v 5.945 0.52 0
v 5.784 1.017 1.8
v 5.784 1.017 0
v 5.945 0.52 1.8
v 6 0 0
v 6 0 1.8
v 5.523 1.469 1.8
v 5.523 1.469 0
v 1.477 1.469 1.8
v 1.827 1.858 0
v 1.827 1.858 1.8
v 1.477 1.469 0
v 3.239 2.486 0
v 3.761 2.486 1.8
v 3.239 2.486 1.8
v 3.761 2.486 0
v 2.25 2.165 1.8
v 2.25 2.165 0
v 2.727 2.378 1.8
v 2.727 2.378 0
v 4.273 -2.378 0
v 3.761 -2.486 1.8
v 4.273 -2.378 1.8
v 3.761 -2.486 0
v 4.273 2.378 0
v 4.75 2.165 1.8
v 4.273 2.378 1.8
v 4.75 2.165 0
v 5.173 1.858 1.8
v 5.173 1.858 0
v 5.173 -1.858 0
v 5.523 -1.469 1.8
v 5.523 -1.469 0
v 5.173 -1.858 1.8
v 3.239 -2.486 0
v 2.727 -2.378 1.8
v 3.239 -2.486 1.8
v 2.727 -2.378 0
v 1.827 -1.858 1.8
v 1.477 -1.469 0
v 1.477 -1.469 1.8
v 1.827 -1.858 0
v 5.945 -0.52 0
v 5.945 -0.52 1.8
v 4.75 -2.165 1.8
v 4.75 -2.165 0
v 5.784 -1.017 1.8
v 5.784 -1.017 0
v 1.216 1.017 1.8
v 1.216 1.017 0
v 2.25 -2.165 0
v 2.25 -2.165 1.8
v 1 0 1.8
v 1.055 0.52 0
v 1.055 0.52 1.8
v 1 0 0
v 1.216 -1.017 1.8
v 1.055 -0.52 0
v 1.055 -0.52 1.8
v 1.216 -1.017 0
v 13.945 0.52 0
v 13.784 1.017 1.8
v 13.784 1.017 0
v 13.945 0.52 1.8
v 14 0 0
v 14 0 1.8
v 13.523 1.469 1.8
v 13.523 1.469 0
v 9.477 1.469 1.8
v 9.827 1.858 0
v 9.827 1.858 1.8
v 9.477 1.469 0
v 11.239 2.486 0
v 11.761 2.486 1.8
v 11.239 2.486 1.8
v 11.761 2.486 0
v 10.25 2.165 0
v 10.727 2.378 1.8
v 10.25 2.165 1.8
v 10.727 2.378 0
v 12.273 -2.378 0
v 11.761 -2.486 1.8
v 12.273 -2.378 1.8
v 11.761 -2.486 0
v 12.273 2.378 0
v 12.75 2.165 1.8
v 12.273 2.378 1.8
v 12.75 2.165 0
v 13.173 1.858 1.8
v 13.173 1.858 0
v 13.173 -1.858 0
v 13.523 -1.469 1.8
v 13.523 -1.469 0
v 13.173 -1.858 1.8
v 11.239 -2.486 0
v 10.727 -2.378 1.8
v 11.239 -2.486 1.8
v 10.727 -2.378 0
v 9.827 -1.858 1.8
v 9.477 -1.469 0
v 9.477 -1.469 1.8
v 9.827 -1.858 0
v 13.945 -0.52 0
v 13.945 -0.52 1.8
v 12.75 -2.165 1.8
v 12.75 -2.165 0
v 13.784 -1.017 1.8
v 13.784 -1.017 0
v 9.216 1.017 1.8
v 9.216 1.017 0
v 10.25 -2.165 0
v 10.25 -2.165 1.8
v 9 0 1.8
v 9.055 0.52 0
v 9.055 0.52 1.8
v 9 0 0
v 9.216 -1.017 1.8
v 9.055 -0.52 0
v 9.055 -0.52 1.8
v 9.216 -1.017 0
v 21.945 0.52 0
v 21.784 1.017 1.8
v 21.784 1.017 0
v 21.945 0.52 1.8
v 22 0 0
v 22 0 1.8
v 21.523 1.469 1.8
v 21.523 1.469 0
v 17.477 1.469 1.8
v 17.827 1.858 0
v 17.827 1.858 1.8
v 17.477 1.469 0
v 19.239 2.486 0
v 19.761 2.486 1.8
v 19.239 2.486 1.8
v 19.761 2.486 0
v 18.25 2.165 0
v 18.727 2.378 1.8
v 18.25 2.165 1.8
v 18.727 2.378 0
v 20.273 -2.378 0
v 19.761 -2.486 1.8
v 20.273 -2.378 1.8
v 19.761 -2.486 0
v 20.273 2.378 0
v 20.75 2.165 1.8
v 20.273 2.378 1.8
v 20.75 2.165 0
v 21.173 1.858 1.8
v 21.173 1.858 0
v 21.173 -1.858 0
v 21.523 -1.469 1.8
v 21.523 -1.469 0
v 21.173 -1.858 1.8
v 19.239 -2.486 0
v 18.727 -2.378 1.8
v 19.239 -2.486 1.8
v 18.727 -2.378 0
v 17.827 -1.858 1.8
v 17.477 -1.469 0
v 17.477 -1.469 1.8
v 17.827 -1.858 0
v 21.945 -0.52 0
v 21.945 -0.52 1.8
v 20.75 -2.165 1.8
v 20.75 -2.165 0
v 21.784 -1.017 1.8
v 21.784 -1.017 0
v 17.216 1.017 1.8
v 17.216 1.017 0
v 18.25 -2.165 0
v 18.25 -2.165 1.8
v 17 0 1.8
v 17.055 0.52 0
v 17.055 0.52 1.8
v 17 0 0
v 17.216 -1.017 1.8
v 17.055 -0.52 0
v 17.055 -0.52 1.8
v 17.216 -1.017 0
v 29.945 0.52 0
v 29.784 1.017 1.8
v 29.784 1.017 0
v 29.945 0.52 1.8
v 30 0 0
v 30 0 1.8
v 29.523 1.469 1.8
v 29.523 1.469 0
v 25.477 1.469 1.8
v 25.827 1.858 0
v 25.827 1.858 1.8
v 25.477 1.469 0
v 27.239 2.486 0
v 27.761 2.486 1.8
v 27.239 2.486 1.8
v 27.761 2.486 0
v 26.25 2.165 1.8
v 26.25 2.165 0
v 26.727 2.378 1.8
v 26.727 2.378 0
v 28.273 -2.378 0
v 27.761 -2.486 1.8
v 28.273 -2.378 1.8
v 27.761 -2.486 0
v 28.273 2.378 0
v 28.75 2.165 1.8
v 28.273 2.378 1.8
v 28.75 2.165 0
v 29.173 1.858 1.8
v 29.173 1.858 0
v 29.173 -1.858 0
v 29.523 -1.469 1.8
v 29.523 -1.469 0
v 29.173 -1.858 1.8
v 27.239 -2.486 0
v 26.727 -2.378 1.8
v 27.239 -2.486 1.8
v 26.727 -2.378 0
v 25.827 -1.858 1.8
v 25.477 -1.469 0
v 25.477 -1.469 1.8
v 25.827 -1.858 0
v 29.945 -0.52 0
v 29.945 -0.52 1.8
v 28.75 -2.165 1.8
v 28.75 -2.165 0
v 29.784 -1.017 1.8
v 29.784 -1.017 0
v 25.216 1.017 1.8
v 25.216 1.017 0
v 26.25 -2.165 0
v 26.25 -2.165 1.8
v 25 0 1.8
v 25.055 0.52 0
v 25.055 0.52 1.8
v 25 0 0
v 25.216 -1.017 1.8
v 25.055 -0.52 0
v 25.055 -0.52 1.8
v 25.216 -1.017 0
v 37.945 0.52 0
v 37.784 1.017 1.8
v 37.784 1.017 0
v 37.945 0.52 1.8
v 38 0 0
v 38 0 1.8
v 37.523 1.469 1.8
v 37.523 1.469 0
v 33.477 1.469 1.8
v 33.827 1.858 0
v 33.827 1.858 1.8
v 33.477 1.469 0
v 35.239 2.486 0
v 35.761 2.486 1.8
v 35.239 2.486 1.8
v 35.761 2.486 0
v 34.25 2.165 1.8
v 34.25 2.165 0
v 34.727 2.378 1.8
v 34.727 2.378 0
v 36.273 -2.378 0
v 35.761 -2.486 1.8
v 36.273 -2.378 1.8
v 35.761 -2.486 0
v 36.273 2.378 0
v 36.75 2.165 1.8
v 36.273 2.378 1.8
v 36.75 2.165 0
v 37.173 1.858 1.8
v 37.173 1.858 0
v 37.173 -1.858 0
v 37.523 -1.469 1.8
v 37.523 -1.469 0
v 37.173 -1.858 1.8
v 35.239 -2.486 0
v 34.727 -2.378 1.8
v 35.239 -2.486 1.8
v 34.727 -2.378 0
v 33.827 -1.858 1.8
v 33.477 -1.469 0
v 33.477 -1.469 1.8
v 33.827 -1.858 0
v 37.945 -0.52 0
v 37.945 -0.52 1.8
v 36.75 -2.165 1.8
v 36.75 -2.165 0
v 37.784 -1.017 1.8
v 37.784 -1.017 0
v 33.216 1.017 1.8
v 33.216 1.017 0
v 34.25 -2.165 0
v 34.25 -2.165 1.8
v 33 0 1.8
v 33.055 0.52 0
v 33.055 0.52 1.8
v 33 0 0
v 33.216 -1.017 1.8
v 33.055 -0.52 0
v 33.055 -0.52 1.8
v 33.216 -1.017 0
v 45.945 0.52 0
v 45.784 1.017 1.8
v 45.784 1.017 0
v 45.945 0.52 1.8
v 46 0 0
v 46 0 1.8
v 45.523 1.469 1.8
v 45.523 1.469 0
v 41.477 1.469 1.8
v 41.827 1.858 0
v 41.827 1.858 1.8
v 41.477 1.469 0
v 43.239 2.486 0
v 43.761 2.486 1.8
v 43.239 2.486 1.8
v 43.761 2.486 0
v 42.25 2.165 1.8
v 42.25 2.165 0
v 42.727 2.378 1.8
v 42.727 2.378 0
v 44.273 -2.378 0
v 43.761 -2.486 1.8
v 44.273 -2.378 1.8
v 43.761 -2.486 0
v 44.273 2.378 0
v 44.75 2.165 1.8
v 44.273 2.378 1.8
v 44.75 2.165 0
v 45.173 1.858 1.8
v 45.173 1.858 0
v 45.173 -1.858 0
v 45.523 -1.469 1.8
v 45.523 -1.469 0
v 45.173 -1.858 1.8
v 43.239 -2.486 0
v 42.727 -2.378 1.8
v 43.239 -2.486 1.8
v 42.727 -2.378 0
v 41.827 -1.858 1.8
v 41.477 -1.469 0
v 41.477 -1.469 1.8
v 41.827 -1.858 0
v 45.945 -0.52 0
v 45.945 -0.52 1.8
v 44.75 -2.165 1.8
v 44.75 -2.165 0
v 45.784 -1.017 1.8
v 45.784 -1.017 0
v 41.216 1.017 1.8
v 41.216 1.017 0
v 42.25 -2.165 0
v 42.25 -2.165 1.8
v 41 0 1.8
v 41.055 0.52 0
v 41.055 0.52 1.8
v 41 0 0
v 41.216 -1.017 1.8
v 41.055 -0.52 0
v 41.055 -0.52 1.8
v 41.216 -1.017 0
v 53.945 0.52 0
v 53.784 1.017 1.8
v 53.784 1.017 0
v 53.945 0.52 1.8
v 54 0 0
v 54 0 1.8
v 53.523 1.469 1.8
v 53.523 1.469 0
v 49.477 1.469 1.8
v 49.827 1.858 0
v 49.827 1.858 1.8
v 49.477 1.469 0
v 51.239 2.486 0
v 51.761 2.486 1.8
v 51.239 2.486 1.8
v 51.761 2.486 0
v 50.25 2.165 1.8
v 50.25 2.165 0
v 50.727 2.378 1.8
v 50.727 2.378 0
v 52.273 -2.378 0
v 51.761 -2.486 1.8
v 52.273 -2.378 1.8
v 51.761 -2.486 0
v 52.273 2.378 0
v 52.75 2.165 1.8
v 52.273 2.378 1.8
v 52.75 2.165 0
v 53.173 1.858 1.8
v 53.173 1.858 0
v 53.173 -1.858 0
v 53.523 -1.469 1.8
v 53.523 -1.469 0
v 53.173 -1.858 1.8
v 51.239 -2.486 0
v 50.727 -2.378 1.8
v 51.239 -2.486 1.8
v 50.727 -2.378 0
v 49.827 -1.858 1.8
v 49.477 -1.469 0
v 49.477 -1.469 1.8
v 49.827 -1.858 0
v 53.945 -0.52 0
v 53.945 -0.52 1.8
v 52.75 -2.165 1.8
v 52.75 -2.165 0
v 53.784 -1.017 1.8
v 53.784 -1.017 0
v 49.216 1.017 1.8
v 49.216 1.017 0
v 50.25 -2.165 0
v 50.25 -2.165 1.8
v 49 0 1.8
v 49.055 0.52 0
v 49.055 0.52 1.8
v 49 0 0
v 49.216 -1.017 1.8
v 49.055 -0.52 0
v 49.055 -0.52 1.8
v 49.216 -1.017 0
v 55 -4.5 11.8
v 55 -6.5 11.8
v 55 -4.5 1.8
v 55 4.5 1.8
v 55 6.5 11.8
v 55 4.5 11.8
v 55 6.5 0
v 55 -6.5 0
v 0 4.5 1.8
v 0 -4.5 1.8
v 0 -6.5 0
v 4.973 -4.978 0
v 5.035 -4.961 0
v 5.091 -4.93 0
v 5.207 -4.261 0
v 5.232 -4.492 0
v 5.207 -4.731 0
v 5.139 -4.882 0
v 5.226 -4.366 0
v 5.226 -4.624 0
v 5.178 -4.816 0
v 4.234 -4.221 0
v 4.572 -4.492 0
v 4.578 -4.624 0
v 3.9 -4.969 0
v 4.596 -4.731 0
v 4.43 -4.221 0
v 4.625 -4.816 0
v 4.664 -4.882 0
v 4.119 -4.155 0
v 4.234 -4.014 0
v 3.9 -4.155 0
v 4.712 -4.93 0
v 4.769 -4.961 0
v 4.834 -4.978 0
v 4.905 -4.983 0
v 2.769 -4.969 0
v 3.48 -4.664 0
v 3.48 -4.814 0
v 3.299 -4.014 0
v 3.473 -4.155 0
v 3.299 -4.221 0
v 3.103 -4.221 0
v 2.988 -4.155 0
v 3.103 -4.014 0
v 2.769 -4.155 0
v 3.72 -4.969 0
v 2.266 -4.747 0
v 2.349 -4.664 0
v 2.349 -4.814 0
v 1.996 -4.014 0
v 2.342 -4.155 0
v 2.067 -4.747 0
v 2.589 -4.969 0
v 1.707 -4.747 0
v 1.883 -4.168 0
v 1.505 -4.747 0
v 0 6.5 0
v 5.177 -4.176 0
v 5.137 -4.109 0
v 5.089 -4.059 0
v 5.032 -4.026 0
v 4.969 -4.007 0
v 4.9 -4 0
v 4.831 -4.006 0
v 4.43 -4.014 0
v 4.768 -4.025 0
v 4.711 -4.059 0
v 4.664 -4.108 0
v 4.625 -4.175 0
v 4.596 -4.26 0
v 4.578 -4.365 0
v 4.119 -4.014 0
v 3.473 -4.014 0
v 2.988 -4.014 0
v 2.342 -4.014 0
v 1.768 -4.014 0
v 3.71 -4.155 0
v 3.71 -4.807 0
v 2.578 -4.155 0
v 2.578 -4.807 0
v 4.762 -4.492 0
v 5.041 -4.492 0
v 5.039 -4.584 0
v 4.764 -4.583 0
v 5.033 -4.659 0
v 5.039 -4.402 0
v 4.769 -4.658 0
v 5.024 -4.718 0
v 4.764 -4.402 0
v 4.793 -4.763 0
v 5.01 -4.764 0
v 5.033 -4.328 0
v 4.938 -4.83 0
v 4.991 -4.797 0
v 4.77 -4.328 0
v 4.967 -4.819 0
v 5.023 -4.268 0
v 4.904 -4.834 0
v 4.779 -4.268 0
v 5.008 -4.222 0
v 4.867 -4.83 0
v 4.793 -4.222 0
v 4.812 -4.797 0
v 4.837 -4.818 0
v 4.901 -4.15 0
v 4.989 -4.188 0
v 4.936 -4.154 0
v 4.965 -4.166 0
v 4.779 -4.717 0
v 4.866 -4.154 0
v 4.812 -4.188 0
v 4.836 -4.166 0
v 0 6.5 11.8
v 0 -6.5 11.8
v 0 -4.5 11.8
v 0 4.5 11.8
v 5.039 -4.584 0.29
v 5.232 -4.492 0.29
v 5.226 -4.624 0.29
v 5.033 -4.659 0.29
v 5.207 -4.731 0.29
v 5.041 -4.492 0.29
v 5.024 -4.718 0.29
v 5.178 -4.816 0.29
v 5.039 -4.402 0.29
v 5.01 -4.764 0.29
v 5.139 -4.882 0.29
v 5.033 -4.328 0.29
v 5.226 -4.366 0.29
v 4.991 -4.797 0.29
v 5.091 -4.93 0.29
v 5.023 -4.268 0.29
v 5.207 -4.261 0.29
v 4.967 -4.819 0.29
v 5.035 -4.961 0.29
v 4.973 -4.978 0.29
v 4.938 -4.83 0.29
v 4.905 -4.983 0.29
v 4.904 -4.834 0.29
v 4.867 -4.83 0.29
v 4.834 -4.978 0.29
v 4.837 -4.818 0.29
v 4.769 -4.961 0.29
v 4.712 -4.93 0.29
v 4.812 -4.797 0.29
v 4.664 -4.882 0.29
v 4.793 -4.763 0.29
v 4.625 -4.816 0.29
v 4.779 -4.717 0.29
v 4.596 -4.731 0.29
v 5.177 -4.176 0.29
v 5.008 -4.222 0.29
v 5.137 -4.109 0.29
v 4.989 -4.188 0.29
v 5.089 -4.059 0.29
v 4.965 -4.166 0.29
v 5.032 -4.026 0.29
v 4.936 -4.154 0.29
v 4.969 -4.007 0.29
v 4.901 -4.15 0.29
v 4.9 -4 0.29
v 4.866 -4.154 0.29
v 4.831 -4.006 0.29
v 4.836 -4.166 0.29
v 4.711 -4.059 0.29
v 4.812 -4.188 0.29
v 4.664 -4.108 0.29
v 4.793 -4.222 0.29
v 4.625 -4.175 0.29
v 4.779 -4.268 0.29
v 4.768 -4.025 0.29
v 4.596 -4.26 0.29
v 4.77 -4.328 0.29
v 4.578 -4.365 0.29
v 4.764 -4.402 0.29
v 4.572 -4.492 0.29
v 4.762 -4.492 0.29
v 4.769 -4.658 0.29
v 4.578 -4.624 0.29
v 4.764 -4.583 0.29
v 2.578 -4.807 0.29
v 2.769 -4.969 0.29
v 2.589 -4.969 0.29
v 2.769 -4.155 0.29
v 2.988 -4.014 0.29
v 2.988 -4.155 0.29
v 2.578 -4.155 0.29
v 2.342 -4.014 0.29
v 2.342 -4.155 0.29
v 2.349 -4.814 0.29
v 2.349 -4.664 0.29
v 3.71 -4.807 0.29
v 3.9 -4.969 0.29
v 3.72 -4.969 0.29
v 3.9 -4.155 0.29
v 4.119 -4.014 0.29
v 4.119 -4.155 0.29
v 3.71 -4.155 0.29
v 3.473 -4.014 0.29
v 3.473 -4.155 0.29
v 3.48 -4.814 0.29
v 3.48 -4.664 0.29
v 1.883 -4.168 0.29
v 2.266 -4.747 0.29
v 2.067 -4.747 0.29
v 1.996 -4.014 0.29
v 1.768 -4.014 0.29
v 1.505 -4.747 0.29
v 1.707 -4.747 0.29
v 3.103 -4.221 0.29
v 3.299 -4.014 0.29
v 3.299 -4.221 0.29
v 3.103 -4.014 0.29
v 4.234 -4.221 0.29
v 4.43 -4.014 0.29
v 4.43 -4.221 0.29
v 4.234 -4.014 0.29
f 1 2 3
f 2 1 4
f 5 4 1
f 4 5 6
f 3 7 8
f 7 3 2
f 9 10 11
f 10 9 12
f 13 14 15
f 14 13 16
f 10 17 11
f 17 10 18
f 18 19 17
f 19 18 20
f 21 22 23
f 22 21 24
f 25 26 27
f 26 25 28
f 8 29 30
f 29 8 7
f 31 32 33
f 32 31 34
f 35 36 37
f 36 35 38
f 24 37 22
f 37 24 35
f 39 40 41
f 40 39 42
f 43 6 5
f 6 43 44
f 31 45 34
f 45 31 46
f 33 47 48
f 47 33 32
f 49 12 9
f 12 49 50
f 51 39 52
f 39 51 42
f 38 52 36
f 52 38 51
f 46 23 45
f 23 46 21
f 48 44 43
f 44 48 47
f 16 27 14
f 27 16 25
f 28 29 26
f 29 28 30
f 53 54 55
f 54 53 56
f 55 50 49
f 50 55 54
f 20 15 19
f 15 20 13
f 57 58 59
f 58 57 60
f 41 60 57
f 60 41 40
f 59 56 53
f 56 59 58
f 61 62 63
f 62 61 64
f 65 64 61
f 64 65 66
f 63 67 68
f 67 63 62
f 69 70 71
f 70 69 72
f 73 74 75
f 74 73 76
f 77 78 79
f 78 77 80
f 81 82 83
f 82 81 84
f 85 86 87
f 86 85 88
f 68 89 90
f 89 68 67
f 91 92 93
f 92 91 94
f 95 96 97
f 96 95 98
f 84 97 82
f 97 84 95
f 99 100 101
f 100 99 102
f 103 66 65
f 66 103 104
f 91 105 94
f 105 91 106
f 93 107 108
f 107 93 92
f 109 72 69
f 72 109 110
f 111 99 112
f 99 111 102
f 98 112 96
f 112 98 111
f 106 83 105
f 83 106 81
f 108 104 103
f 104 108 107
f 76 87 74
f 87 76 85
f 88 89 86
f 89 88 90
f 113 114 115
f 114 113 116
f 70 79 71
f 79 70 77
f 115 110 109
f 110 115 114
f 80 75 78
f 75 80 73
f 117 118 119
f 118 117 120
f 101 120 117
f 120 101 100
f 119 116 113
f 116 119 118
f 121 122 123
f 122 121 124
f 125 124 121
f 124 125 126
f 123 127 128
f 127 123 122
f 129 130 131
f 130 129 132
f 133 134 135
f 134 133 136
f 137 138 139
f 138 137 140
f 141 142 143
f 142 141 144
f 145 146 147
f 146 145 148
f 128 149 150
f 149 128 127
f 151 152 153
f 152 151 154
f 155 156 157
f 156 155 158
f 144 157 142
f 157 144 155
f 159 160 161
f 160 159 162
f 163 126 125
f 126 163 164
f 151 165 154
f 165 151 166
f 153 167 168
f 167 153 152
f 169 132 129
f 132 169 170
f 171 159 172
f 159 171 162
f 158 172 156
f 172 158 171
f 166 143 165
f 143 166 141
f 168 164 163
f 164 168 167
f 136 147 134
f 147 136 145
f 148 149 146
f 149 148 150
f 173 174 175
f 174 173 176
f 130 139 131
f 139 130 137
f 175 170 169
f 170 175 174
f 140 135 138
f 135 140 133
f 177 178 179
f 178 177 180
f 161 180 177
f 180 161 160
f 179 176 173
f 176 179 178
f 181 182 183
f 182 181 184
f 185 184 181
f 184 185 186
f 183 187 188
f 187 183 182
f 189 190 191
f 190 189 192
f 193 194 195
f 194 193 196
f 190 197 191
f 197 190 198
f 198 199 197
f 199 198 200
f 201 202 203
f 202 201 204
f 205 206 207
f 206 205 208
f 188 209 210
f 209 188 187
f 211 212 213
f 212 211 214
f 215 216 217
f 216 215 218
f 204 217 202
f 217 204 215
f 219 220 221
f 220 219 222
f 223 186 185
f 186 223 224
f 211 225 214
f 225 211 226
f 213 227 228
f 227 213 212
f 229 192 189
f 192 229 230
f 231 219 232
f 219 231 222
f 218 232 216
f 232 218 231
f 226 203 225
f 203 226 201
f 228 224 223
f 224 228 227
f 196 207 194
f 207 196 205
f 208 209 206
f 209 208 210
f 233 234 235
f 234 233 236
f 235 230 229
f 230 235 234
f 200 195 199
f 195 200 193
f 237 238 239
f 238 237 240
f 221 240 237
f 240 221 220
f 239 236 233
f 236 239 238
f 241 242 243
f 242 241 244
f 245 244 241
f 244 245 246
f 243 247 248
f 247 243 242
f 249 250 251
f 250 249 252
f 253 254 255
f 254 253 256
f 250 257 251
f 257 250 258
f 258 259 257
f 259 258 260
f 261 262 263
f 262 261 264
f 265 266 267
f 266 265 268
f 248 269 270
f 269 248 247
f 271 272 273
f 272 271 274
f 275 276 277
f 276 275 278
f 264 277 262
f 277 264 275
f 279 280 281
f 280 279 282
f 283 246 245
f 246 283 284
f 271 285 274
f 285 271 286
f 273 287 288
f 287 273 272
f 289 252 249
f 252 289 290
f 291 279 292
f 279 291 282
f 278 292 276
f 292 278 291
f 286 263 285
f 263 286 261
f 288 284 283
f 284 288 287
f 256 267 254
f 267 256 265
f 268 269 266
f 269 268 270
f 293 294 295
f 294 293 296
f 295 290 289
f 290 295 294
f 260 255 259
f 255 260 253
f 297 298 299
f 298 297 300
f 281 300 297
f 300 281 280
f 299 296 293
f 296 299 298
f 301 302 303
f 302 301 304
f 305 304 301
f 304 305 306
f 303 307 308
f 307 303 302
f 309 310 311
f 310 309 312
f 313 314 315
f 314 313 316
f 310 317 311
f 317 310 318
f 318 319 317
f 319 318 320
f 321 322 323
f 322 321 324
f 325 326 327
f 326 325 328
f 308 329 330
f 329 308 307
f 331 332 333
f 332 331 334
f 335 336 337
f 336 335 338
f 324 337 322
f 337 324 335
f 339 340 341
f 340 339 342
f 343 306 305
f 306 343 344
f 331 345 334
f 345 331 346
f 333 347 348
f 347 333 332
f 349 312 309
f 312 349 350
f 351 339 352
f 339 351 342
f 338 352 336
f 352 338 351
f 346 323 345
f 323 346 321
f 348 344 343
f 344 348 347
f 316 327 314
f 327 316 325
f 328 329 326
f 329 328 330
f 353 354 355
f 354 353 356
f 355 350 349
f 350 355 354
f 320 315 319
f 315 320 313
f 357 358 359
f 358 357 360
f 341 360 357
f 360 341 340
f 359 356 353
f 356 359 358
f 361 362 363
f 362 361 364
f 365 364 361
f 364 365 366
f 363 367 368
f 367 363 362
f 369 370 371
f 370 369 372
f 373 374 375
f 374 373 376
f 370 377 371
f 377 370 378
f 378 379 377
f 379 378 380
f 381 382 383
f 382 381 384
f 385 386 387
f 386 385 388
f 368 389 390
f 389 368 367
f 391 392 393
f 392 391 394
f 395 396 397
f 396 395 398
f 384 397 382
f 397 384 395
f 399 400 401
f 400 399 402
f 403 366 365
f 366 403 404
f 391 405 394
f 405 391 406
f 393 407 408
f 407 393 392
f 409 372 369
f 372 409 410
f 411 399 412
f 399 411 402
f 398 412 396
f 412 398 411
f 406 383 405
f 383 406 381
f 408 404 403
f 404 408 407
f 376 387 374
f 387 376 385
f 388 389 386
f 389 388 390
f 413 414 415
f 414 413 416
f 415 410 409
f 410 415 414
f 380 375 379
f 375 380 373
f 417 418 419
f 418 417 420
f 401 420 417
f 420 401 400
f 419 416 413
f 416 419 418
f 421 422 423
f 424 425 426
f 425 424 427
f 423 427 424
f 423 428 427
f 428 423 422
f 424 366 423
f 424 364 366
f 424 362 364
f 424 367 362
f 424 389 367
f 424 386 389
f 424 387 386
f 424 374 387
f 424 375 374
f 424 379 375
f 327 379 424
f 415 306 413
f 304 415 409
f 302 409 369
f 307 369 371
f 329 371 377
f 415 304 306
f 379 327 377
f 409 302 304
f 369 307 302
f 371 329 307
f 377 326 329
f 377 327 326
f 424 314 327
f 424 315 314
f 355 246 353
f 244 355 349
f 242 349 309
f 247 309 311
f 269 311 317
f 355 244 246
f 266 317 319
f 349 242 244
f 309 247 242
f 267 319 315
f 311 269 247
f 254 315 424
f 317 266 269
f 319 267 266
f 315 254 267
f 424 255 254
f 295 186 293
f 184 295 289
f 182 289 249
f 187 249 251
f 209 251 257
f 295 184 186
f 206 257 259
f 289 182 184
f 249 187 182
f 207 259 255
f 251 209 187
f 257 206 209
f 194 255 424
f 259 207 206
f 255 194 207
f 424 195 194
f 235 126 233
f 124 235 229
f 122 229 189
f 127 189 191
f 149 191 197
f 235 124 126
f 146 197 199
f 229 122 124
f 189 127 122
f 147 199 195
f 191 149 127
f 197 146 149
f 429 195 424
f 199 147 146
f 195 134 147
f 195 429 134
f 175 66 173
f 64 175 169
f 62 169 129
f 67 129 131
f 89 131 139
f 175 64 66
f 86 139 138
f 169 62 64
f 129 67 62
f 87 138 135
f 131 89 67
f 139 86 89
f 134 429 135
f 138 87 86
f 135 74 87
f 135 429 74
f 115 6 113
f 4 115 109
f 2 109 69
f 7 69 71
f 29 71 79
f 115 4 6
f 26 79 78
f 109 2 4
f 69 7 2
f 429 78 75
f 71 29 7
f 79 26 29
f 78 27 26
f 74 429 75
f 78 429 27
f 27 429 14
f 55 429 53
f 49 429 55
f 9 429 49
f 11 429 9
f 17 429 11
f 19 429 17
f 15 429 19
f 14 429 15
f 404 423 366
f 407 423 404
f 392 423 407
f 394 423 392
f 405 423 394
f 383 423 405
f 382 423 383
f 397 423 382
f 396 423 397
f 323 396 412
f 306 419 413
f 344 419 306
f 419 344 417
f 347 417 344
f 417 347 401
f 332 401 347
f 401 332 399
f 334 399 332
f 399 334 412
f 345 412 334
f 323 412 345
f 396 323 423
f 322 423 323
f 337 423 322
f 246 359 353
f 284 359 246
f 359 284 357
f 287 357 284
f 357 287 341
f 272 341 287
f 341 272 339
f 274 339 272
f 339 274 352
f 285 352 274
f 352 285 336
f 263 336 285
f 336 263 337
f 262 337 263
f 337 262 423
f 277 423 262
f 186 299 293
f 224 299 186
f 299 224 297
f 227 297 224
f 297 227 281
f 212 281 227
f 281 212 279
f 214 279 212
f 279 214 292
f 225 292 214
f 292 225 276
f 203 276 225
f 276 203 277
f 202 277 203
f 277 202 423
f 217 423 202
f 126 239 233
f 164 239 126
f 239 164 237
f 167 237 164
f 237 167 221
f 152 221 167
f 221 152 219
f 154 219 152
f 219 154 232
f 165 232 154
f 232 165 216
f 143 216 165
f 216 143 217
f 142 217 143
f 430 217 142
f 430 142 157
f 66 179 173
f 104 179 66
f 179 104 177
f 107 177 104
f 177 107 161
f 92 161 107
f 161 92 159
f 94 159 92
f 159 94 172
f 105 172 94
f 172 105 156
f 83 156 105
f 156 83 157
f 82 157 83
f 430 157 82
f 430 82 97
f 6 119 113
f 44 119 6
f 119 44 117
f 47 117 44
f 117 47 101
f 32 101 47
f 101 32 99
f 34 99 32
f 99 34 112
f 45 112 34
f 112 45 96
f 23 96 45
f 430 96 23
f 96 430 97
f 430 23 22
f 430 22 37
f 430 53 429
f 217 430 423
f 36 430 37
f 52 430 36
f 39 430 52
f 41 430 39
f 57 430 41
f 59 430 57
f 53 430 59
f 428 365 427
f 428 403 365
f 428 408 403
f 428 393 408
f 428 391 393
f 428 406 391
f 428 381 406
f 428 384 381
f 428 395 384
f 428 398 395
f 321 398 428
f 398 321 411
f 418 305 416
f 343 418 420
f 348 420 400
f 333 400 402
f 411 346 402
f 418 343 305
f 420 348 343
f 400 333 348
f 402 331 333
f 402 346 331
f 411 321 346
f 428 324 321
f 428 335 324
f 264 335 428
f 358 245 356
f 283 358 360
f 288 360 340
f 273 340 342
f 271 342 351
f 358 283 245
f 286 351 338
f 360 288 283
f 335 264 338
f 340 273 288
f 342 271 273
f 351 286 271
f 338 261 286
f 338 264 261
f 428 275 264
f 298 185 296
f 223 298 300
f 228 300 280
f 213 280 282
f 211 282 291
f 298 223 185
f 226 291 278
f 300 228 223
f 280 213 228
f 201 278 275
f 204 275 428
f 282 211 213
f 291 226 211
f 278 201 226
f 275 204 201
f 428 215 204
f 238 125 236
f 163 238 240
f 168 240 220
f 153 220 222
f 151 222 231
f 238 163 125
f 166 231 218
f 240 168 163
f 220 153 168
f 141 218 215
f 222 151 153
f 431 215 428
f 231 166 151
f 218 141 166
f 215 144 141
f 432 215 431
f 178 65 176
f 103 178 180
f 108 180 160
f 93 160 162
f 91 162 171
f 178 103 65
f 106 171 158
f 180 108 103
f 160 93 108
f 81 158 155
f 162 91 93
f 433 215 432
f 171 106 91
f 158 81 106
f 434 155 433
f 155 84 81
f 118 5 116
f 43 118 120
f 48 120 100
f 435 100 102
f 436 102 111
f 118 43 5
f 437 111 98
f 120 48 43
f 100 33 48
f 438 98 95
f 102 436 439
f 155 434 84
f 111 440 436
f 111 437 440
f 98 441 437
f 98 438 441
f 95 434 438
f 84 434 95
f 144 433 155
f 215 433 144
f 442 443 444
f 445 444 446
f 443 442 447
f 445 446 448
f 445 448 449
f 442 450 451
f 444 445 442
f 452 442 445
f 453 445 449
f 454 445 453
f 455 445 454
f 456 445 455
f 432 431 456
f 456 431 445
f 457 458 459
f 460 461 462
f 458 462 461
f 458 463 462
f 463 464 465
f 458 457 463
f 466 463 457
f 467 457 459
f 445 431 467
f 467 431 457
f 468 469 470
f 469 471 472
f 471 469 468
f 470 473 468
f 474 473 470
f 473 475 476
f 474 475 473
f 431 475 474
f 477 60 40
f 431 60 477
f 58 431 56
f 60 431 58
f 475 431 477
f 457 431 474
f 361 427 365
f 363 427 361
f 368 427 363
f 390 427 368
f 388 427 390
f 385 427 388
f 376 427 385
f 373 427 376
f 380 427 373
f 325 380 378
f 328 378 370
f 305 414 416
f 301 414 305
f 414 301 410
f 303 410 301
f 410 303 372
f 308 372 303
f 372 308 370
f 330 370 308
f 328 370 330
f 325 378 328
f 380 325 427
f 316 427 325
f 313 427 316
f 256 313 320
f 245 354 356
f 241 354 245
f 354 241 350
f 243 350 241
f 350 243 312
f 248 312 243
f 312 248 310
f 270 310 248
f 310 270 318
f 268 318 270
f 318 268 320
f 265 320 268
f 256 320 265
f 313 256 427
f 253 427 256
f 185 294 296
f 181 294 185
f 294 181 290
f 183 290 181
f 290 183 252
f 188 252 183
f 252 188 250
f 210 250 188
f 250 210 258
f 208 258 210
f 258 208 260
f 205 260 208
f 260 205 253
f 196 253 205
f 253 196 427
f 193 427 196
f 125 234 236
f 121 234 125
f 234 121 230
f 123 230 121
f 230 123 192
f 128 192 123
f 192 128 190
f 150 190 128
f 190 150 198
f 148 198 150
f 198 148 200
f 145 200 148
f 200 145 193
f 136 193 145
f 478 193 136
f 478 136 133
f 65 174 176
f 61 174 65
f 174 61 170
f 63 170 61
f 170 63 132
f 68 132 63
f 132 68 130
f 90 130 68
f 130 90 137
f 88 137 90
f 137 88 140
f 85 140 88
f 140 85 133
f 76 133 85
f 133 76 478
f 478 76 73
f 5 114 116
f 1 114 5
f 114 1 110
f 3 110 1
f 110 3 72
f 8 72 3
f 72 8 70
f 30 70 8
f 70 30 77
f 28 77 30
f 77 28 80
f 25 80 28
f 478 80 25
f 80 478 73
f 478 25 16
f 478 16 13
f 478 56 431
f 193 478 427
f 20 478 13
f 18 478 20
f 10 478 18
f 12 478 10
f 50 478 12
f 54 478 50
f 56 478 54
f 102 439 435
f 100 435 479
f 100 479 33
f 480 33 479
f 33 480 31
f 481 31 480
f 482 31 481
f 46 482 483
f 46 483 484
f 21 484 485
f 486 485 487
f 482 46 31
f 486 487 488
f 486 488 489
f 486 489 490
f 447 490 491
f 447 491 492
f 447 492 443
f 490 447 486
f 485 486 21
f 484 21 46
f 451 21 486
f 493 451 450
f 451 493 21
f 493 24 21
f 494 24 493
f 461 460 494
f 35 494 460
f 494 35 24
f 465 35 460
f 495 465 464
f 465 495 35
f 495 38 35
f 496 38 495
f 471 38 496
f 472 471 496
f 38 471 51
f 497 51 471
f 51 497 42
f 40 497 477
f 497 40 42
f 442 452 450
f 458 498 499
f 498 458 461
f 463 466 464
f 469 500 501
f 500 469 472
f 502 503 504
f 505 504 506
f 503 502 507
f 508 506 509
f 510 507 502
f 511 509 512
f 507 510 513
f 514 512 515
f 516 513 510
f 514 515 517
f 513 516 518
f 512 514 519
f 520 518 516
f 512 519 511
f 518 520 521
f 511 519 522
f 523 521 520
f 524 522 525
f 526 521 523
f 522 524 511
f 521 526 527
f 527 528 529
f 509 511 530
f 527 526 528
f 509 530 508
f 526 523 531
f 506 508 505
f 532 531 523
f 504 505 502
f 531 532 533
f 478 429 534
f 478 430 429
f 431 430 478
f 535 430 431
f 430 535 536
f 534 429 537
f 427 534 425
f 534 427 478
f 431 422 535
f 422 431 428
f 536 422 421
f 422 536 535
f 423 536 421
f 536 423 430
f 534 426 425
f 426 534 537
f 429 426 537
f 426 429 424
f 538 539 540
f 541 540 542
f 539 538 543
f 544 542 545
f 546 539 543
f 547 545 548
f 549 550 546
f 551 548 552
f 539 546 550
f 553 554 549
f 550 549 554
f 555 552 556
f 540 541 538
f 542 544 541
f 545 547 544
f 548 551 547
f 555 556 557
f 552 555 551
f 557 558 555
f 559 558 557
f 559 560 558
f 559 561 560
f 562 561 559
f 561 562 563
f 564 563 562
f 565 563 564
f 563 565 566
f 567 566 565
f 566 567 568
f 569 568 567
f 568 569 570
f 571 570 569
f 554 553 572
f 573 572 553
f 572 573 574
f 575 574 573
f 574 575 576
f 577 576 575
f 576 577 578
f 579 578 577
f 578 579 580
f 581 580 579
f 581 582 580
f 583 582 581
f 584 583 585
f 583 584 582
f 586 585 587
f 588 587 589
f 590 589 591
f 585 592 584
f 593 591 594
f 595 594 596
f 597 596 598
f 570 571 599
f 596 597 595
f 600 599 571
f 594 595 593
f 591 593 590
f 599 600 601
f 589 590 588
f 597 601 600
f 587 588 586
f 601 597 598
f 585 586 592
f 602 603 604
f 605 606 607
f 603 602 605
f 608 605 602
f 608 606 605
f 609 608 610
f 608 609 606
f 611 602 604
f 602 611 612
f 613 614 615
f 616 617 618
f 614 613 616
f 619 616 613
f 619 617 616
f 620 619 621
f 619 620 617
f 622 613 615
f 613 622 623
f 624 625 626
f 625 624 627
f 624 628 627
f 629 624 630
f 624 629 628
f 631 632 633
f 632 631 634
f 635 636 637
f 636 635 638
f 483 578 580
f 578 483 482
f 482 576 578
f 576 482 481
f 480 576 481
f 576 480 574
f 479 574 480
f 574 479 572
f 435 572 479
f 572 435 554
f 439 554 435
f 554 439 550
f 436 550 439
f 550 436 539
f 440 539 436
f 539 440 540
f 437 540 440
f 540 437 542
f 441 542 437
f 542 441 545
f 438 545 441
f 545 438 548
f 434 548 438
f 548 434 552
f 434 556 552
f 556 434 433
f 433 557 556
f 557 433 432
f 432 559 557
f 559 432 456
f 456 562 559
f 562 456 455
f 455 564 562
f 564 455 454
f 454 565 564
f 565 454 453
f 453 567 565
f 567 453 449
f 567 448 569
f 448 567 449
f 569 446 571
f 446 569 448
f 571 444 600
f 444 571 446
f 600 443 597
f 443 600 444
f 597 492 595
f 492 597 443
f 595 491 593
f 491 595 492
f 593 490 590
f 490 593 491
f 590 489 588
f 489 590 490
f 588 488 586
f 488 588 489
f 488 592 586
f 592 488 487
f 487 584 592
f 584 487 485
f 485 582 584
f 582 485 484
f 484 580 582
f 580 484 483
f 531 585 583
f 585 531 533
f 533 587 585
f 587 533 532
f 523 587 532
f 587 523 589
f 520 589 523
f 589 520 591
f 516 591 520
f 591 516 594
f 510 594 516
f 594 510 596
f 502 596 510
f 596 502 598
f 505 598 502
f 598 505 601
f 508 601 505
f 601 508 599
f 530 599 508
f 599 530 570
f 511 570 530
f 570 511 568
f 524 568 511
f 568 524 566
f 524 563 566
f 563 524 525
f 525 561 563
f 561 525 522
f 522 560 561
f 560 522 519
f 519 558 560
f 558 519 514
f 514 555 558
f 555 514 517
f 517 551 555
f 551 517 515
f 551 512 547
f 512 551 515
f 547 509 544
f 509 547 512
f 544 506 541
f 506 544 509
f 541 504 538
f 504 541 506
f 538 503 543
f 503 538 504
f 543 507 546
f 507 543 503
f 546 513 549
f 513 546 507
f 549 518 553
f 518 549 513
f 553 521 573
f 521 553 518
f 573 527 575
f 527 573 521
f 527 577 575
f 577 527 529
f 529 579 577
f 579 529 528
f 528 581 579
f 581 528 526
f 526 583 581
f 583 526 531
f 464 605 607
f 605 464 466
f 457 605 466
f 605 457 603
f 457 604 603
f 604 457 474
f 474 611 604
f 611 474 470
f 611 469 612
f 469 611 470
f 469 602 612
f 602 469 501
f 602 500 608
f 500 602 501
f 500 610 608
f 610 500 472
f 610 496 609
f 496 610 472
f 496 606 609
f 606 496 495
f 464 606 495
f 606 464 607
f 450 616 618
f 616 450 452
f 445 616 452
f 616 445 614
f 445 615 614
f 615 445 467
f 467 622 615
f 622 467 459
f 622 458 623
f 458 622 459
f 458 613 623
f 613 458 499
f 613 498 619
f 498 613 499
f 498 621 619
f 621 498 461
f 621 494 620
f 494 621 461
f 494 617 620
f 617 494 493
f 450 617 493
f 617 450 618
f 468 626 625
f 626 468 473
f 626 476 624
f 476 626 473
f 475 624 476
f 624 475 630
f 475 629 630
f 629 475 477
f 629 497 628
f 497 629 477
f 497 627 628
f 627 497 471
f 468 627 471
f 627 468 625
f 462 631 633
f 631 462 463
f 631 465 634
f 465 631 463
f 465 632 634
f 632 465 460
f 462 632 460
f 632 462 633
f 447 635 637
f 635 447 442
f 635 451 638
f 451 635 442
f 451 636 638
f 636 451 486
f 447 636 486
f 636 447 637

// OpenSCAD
// file: common.scad
CENTER_SIZE = 9;
SLEEVE_LENGTH = 55;
SLEEVE_REACH = SLEEVE_LENGTH + CENTER_SIZE/2;
GROOVE_WIDTH = 9;
WALL_HEIGHT = 10;
WALL_THICKNESS = 2;
BASE_THICKNESS = 2;
TOTAL_WIDTH = GROOVE_WIDTH + 2 * WALL_THICKNESS;
DOWEL_DIAMETER = 4.5;
DOWEL_DEPTH = 3;
CARDBOARD_THICKNESS = 2;
GROOVE_BOTTOM = CARDBOARD_THICKNESS;
CURVE_POWER = 2;
CURVE_POINTS = 20;
TILT_ANGLE_EXTRA = 5;
FLEXIBLE_WALL_HEIGHT = WALL_HEIGHT * 2;

LEFT = 3;
RIGHT = 1;

function wall_curve(z, wall_height) =
    GROOVE_BOTTOM/2 + (GROOVE_WIDTH/2 - GROOVE_BOTTOM/2) * pow(z/wall_height, CURVE_POWER);

module curved_wall_profile(side, wall_height) {
    points_inner = [for (i = [0:CURVE_POINTS])
        [wall_curve(i * wall_height / CURVE_POINTS, wall_height) * side,
         i * wall_height / CURVE_POINTS]
    ];
    points_outer = [for (i = [0:CURVE_POINTS])
        [(wall_curve(i * wall_height / CURVE_POINTS, wall_height) + WALL_THICKNESS) * side,
         i * wall_height / CURVE_POINTS]
    ];
    all_points = concat(
        [[points_inner[0][0], 0]],
        points_inner,
        [points_outer[len(points_outer)-1]],
        [for (i = [len(points_outer)-1:-1:0]) points_outer[i]],
        [[points_outer[0][0], 0]]
    );
    polygon(all_points);
}

module draw_regular_wall_base(width, z_offset = BASE_THICKNESS) {
    translate([0, 0, z_offset])
        cube([width, WALL_THICKNESS, WALL_HEIGHT]);
}

module draw_flexible_wall_base(width, z_offset = BASE_THICKNESS) {
    wall_height = FLEXIBLE_WALL_HEIGHT - z_offset;
    tilt_angle = atan((GROOVE_WIDTH/2 - GROOVE_BOTTOM/2) / wall_height) + TILT_ANGLE_EXTRA;
    translate([0, -WALL_THICKNESS/2, z_offset - 2])
        rotate([tilt_angle + 6, 0, 0])
            rotate([90, 0, 90])
                linear_extrude(height = width)
                    curved_wall_profile(1, wall_height);
}

module draw_center_base(with_dowel = false) {
    union() {
        translate([-TOTAL_WIDTH/2, -TOTAL_WIDTH/2, 0])
            cube([TOTAL_WIDTH, TOTAL_WIDTH, BASE_THICKNESS]);
        if (with_dowel) {
            translate([0, 0, -DOWEL_DEPTH])
                cylinder(h=DOWEL_DEPTH, d=DOWEL_DIAMETER, $fn=30);
        }
    }
}

module orient_wall(side) {
    if (side == 0) {
        rotate([0, 0, 270])
            children();
    } else if (side == 1) {
        children();
    } else if (side == 2) {
        rotate([0, 0, 90])
            children();
    } else if (side == 3) {
        rotate([0, 0, 180])
            children();
    }
}

module translate_center_wall(side) {
    if (side == 0) {
        translate([CENTER_SIZE/2, TOTAL_WIDTH/2, 0])
            children();
    } else if (side == 1) {
        translate([-TOTAL_WIDTH/2, CENTER_SIZE/2, 0])
            children();
    } else if (side == 2) {
        translate([-CENTER_SIZE/2, -TOTAL_WIDTH/2, 0])
            children();
    } else if (side == 3) {
        translate([TOTAL_WIDTH/2, -CENTER_SIZE/2, 0])
            children();
    }
}

module position_center_wall(side) {
    translate_center_wall(side) {
        orient_wall(side) {
            children();
        }
    }
}

module place_center_wall(side, wall_type = "regular", z_offset = BASE_THICKNESS) {
    position_center_wall(side) {
        if (wall_type == "regular") {
            draw_regular_wall_base(TOTAL_WIDTH, z_offset);
        } else {
            draw_flexible_wall_base(TOTAL_WIDTH, z_offset);
        }
    }
}

module draw_sleeve_base(with_dowel = false) {
    union() {
        translate([0, -TOTAL_WIDTH/2, 0])
            cube([SLEEVE_LENGTH, TOTAL_WIDTH, BASE_THICKNESS]);
        if (with_dowel) {
            translate([25 - CENTER_SIZE/2, 0, -DOWEL_DEPTH])
                cylinder(h=DOWEL_DEPTH, d=DOWEL_DIAMETER, $fn=30);
            translate([50 - CENTER_SIZE/2, 0, -DOWEL_DEPTH])
                cylinder(h=DOWEL_DEPTH, d=DOWEL_DIAMETER, $fn=30);
        }
    }
}

module translate_sleeve_wall(side) {
    if (side == LEFT) {
        translate([SLEEVE_LENGTH, -TOTAL_WIDTH/2 + WALL_THICKNESS, 0])
            children();
    } else if (side == RIGHT) {
        translate([0, TOTAL_WIDTH/2 - WALL_THICKNESS, 0])
            children();
    }
}

module position_sleeve_wall(side) {
    translate_sleeve_wall(side) {
        orient_wall(side) {
            children();
        }
    }
}

module draw_sleeve_wall(side, wall_type = "regular", z_offset = BASE_THICKNESS) {
    position_sleeve_wall(side) {
        if (wall_type == "regular") {
            draw_regular_wall_base(SLEEVE_LENGTH, z_offset);
        } else {
            draw_flexible_wall_base(SLEEVE_LENGTH, z_offset);
        }
    }
}

module draw_full_sleeve(with_dowel = false, wall_type = "regular", z_offset = BASE_THICKNESS) {
    union() {
        draw_sleeve_base(with_dowel);
        draw_sleeve_wall(LEFT, wall_type, z_offset);
        draw_sleeve_wall(RIGHT, wall_type, z_offset);
    }
}

module place_sleeve(side, with_dowel = false, wall_type = "regular", z_offset = BASE_THICKNESS) {
    if (side == 0) {
        translate([CENTER_SIZE/2, 0, 0])
            draw_full_sleeve(with_dowel, wall_type, z_offset);
    } else if (side == 1) {
        rotate([0, 0, 90])
            translate([CENTER_SIZE/2, 0, 0])
                draw_full_sleeve(with_dowel, wall_type, z_offset);
    } else if (side == 2) {
        rotate([0, 0, 180])
            translate([CENTER_SIZE/2, 0, 0])
                draw_full_sleeve(with_dowel, wall_type, z_offset);
    } else if (side == 3) {
        rotate([0, 0, 270])
            translate([CENTER_SIZE/2, 0, 0])
                draw_full_sleeve(with_dowel, wall_type, z_offset);
    }
}

module add_dowel(x, y, dowel_diameter, dowel_depth) {
    translate([x, y, -dowel_depth])
        cylinder(h=dowel_depth, d=dowel_diameter, $fn=30);
}
// file: version.scad
VERSION = "v1.1.0";

module engrave_version_text(text, size=1.0, depth=0.3) {
    linear_extrude(height=depth)
        text(text, size=size, font="Liberation Sans:style=Bold", halign="left", valign="bottom");
}

module print_version_at(x, y, z) {
    translate([x, y, z])
        rotate([180, 0, 0])
            translate([0, 0, -0.29])
                engrave_version_text(VERSION);
}

module print_version(x=-5, y=-4, z=0) {
    print_version_at(x, y, z);
}

module print_version_sleeve(x=1.5, y=-4, z=0) {
    print_version_at(x, y, z);
}
// file: lego.scad
include <common.scad>

LEGO_STUD_DIAMETER = 4.8;
LEGO_STUD_HEIGHT = 1.8;
LEGO_UNIT = 8;
LEGO_HOLE_DIAMETER = 5.0;
LEGO_NICHE_DEPTH = 2.2;
LEGO_NICHE_ROOF = 1.0;
LEGO_NICHE_BASE_THICKNESS = LEGO_NICHE_DEPTH + LEGO_NICHE_ROOF;
LEGO_INTER_CYLINDER_DIAMETER = LEGO_UNIT - LEGO_STUD_DIAMETER - 0.2;
LEGO_INTER_CYLINDER_HOLE_DIAMETER = 1.5;
LEGO_NICHE_WIDTH = LEGO_HOLE_DIAMETER;

module draw_lego_stud() {
    cylinder(h=LEGO_STUD_HEIGHT, d=LEGO_STUD_DIAMETER, $fn=30);
}

module draw_lego_hole() {
    cylinder(h=LEGO_STUD_HEIGHT + 0.1, d=LEGO_HOLE_DIAMETER, $fn=30);
}

module draw_center_with_studs(with_dowel = false) {
    union() {
        draw_center_base(with_dowel);
        translate([0, 0, BASE_THICKNESS])
            draw_lego_stud();
    }
}

module draw_sleeve_with_studs(with_dowel = false) {
    first_stud_candidate = LEGO_UNIT - (CENTER_SIZE/2 % LEGO_UNIT);
    first_stud = first_stud_candidate < LEGO_STUD_DIAMETER/2
                 ? first_stud_candidate + LEGO_UNIT
                 : first_stud_candidate;

    max_stud_position = SLEEVE_LENGTH - LEGO_STUD_DIAMETER/2;
    num_studs = floor((max_stud_position - first_stud) / LEGO_UNIT) + 1;

    union() {
        draw_sleeve_base(with_dowel);
        for (i = [0:num_studs-1]) {
            translate([first_stud + i * LEGO_UNIT, 0, BASE_THICKNESS])
                draw_lego_stud();
        }
    }
}

module place_sleeve_with_studs(side, with_dowel = false) {
    if (side == 0) {
        translate([CENTER_SIZE/2, 0, 0])
            draw_sleeve_with_studs(with_dowel);
    } else if (side == 1) {
        rotate([0, 0, 90])
            translate([CENTER_SIZE/2, 0, 0])
                draw_sleeve_with_studs(with_dowel);
    } else if (side == 2) {
        rotate([0, 0, 180])
            translate([CENTER_SIZE/2, 0, 0])
                draw_sleeve_with_studs(with_dowel);
    } else if (side == 3) {
        rotate([0, 0, 270])
            translate([CENTER_SIZE/2, 0, 0])
                draw_sleeve_with_studs(with_dowel);
    }
}

module draw_sleeve_base_with_simple_holes() {
    first_stud_candidate = LEGO_UNIT - (CENTER_SIZE/2 % LEGO_UNIT);
    first_stud = first_stud_candidate < LEGO_STUD_DIAMETER/2
                 ? first_stud_candidate + LEGO_UNIT
                 : first_stud_candidate;

    max_stud_position = SLEEVE_LENGTH - LEGO_STUD_DIAMETER/2;
    num_studs = floor((max_stud_position - first_stud) / LEGO_UNIT) + 1;

    difference() {
        translate([0, -TOTAL_WIDTH/2, 0])
            cube([SLEEVE_LENGTH, TOTAL_WIDTH, LEGO_STUD_HEIGHT]);

        for (i = [0:num_studs-1]) {
            translate([first_stud + i * LEGO_UNIT, 0, -0.05])
                draw_lego_hole();
        }
    }
}


module draw_sleeve_base_with_niche() {
    first_stud_candidate = LEGO_UNIT - (CENTER_SIZE/2 % LEGO_UNIT);
    first_stud = first_stud_candidate < LEGO_STUD_DIAMETER/2
                 ? first_stud_candidate + LEGO_UNIT
                 : first_stud_candidate;

    max_stud_position = SLEEVE_LENGTH - LEGO_STUD_DIAMETER/2;
    num_studs = floor((max_stud_position - first_stud) / LEGO_UNIT) + 1;

    niche_x_start = first_stud - LEGO_STUD_DIAMETER/2;
    niche_x_end = first_stud + (num_studs - 1) * LEGO_UNIT + LEGO_STUD_DIAMETER/2;
    niche_length = niche_x_end - niche_x_start;

    union() {
        difference() {
            translate([0, -TOTAL_WIDTH/2, 0])
                cube([SLEEVE_LENGTH, TOTAL_WIDTH, LEGO_NICHE_BASE_THICKNESS]);

            translate([niche_x_start, -LEGO_NICHE_WIDTH/2, 0])
                cube([niche_length, LEGO_NICHE_WIDTH, LEGO_NICHE_DEPTH + 0.1]);

            for (i = [0:num_studs-1]) {
                translate([first_stud + i * LEGO_UNIT, 0, -0.05])
                    cylinder(h=LEGO_NICHE_DEPTH + 0.1, d=LEGO_HOLE_DIAMETER, $fn=30);
            }
        }

        for (i = [0:num_studs-2]) {
            translate([first_stud + i * LEGO_UNIT + LEGO_UNIT/2, 0, LEGO_NICHE_DEPTH / 3])
                difference() {
                    cylinder(h=LEGO_NICHE_DEPTH * 2/3, d=LEGO_INTER_CYLINDER_DIAMETER, $fn=30);
                    translate([0, 0, -0.05])
                        cylinder(h=LEGO_NICHE_DEPTH * 2/3 + 0.1, d=LEGO_INTER_CYLINDER_HOLE_DIAMETER, $fn=30);
                }
        }
    }
}

module draw_sleeve_with_simple_holes() {
    union() {
        draw_sleeve_base_with_simple_holes();
        draw_sleeve_wall(LEFT, "regular", LEGO_STUD_HEIGHT);
        draw_sleeve_wall(RIGHT, "regular", LEGO_STUD_HEIGHT);
    }
}

module draw_sleeve_with_simple_holes_flexible() {
    union() {
        draw_sleeve_base_with_simple_holes();
        draw_sleeve_wall(LEFT, "flexible", LEGO_STUD_HEIGHT);
        draw_sleeve_wall(RIGHT, "flexible", LEGO_STUD_HEIGHT);
    }
}


module draw_sleeve_with_niche() {
    union() {
        draw_sleeve_base_with_niche();
        draw_sleeve_wall(LEFT, "regular", LEGO_NICHE_BASE_THICKNESS);
        draw_sleeve_wall(RIGHT, "regular", LEGO_NICHE_BASE_THICKNESS);
    }
}

module draw_sleeve_with_niche_flexible() {
    union() {
        draw_sleeve_base_with_niche();
        draw_sleeve_wall(LEFT, "flexible", LEGO_NICHE_BASE_THICKNESS);
        draw_sleeve_wall(RIGHT, "flexible", LEGO_NICHE_BASE_THICKNESS);
    }
}
// main file
use <lego.scad>
use <version.scad>

difference() {
    draw_sleeve_with_simple_holes();
    print_version_sleeve();
}
